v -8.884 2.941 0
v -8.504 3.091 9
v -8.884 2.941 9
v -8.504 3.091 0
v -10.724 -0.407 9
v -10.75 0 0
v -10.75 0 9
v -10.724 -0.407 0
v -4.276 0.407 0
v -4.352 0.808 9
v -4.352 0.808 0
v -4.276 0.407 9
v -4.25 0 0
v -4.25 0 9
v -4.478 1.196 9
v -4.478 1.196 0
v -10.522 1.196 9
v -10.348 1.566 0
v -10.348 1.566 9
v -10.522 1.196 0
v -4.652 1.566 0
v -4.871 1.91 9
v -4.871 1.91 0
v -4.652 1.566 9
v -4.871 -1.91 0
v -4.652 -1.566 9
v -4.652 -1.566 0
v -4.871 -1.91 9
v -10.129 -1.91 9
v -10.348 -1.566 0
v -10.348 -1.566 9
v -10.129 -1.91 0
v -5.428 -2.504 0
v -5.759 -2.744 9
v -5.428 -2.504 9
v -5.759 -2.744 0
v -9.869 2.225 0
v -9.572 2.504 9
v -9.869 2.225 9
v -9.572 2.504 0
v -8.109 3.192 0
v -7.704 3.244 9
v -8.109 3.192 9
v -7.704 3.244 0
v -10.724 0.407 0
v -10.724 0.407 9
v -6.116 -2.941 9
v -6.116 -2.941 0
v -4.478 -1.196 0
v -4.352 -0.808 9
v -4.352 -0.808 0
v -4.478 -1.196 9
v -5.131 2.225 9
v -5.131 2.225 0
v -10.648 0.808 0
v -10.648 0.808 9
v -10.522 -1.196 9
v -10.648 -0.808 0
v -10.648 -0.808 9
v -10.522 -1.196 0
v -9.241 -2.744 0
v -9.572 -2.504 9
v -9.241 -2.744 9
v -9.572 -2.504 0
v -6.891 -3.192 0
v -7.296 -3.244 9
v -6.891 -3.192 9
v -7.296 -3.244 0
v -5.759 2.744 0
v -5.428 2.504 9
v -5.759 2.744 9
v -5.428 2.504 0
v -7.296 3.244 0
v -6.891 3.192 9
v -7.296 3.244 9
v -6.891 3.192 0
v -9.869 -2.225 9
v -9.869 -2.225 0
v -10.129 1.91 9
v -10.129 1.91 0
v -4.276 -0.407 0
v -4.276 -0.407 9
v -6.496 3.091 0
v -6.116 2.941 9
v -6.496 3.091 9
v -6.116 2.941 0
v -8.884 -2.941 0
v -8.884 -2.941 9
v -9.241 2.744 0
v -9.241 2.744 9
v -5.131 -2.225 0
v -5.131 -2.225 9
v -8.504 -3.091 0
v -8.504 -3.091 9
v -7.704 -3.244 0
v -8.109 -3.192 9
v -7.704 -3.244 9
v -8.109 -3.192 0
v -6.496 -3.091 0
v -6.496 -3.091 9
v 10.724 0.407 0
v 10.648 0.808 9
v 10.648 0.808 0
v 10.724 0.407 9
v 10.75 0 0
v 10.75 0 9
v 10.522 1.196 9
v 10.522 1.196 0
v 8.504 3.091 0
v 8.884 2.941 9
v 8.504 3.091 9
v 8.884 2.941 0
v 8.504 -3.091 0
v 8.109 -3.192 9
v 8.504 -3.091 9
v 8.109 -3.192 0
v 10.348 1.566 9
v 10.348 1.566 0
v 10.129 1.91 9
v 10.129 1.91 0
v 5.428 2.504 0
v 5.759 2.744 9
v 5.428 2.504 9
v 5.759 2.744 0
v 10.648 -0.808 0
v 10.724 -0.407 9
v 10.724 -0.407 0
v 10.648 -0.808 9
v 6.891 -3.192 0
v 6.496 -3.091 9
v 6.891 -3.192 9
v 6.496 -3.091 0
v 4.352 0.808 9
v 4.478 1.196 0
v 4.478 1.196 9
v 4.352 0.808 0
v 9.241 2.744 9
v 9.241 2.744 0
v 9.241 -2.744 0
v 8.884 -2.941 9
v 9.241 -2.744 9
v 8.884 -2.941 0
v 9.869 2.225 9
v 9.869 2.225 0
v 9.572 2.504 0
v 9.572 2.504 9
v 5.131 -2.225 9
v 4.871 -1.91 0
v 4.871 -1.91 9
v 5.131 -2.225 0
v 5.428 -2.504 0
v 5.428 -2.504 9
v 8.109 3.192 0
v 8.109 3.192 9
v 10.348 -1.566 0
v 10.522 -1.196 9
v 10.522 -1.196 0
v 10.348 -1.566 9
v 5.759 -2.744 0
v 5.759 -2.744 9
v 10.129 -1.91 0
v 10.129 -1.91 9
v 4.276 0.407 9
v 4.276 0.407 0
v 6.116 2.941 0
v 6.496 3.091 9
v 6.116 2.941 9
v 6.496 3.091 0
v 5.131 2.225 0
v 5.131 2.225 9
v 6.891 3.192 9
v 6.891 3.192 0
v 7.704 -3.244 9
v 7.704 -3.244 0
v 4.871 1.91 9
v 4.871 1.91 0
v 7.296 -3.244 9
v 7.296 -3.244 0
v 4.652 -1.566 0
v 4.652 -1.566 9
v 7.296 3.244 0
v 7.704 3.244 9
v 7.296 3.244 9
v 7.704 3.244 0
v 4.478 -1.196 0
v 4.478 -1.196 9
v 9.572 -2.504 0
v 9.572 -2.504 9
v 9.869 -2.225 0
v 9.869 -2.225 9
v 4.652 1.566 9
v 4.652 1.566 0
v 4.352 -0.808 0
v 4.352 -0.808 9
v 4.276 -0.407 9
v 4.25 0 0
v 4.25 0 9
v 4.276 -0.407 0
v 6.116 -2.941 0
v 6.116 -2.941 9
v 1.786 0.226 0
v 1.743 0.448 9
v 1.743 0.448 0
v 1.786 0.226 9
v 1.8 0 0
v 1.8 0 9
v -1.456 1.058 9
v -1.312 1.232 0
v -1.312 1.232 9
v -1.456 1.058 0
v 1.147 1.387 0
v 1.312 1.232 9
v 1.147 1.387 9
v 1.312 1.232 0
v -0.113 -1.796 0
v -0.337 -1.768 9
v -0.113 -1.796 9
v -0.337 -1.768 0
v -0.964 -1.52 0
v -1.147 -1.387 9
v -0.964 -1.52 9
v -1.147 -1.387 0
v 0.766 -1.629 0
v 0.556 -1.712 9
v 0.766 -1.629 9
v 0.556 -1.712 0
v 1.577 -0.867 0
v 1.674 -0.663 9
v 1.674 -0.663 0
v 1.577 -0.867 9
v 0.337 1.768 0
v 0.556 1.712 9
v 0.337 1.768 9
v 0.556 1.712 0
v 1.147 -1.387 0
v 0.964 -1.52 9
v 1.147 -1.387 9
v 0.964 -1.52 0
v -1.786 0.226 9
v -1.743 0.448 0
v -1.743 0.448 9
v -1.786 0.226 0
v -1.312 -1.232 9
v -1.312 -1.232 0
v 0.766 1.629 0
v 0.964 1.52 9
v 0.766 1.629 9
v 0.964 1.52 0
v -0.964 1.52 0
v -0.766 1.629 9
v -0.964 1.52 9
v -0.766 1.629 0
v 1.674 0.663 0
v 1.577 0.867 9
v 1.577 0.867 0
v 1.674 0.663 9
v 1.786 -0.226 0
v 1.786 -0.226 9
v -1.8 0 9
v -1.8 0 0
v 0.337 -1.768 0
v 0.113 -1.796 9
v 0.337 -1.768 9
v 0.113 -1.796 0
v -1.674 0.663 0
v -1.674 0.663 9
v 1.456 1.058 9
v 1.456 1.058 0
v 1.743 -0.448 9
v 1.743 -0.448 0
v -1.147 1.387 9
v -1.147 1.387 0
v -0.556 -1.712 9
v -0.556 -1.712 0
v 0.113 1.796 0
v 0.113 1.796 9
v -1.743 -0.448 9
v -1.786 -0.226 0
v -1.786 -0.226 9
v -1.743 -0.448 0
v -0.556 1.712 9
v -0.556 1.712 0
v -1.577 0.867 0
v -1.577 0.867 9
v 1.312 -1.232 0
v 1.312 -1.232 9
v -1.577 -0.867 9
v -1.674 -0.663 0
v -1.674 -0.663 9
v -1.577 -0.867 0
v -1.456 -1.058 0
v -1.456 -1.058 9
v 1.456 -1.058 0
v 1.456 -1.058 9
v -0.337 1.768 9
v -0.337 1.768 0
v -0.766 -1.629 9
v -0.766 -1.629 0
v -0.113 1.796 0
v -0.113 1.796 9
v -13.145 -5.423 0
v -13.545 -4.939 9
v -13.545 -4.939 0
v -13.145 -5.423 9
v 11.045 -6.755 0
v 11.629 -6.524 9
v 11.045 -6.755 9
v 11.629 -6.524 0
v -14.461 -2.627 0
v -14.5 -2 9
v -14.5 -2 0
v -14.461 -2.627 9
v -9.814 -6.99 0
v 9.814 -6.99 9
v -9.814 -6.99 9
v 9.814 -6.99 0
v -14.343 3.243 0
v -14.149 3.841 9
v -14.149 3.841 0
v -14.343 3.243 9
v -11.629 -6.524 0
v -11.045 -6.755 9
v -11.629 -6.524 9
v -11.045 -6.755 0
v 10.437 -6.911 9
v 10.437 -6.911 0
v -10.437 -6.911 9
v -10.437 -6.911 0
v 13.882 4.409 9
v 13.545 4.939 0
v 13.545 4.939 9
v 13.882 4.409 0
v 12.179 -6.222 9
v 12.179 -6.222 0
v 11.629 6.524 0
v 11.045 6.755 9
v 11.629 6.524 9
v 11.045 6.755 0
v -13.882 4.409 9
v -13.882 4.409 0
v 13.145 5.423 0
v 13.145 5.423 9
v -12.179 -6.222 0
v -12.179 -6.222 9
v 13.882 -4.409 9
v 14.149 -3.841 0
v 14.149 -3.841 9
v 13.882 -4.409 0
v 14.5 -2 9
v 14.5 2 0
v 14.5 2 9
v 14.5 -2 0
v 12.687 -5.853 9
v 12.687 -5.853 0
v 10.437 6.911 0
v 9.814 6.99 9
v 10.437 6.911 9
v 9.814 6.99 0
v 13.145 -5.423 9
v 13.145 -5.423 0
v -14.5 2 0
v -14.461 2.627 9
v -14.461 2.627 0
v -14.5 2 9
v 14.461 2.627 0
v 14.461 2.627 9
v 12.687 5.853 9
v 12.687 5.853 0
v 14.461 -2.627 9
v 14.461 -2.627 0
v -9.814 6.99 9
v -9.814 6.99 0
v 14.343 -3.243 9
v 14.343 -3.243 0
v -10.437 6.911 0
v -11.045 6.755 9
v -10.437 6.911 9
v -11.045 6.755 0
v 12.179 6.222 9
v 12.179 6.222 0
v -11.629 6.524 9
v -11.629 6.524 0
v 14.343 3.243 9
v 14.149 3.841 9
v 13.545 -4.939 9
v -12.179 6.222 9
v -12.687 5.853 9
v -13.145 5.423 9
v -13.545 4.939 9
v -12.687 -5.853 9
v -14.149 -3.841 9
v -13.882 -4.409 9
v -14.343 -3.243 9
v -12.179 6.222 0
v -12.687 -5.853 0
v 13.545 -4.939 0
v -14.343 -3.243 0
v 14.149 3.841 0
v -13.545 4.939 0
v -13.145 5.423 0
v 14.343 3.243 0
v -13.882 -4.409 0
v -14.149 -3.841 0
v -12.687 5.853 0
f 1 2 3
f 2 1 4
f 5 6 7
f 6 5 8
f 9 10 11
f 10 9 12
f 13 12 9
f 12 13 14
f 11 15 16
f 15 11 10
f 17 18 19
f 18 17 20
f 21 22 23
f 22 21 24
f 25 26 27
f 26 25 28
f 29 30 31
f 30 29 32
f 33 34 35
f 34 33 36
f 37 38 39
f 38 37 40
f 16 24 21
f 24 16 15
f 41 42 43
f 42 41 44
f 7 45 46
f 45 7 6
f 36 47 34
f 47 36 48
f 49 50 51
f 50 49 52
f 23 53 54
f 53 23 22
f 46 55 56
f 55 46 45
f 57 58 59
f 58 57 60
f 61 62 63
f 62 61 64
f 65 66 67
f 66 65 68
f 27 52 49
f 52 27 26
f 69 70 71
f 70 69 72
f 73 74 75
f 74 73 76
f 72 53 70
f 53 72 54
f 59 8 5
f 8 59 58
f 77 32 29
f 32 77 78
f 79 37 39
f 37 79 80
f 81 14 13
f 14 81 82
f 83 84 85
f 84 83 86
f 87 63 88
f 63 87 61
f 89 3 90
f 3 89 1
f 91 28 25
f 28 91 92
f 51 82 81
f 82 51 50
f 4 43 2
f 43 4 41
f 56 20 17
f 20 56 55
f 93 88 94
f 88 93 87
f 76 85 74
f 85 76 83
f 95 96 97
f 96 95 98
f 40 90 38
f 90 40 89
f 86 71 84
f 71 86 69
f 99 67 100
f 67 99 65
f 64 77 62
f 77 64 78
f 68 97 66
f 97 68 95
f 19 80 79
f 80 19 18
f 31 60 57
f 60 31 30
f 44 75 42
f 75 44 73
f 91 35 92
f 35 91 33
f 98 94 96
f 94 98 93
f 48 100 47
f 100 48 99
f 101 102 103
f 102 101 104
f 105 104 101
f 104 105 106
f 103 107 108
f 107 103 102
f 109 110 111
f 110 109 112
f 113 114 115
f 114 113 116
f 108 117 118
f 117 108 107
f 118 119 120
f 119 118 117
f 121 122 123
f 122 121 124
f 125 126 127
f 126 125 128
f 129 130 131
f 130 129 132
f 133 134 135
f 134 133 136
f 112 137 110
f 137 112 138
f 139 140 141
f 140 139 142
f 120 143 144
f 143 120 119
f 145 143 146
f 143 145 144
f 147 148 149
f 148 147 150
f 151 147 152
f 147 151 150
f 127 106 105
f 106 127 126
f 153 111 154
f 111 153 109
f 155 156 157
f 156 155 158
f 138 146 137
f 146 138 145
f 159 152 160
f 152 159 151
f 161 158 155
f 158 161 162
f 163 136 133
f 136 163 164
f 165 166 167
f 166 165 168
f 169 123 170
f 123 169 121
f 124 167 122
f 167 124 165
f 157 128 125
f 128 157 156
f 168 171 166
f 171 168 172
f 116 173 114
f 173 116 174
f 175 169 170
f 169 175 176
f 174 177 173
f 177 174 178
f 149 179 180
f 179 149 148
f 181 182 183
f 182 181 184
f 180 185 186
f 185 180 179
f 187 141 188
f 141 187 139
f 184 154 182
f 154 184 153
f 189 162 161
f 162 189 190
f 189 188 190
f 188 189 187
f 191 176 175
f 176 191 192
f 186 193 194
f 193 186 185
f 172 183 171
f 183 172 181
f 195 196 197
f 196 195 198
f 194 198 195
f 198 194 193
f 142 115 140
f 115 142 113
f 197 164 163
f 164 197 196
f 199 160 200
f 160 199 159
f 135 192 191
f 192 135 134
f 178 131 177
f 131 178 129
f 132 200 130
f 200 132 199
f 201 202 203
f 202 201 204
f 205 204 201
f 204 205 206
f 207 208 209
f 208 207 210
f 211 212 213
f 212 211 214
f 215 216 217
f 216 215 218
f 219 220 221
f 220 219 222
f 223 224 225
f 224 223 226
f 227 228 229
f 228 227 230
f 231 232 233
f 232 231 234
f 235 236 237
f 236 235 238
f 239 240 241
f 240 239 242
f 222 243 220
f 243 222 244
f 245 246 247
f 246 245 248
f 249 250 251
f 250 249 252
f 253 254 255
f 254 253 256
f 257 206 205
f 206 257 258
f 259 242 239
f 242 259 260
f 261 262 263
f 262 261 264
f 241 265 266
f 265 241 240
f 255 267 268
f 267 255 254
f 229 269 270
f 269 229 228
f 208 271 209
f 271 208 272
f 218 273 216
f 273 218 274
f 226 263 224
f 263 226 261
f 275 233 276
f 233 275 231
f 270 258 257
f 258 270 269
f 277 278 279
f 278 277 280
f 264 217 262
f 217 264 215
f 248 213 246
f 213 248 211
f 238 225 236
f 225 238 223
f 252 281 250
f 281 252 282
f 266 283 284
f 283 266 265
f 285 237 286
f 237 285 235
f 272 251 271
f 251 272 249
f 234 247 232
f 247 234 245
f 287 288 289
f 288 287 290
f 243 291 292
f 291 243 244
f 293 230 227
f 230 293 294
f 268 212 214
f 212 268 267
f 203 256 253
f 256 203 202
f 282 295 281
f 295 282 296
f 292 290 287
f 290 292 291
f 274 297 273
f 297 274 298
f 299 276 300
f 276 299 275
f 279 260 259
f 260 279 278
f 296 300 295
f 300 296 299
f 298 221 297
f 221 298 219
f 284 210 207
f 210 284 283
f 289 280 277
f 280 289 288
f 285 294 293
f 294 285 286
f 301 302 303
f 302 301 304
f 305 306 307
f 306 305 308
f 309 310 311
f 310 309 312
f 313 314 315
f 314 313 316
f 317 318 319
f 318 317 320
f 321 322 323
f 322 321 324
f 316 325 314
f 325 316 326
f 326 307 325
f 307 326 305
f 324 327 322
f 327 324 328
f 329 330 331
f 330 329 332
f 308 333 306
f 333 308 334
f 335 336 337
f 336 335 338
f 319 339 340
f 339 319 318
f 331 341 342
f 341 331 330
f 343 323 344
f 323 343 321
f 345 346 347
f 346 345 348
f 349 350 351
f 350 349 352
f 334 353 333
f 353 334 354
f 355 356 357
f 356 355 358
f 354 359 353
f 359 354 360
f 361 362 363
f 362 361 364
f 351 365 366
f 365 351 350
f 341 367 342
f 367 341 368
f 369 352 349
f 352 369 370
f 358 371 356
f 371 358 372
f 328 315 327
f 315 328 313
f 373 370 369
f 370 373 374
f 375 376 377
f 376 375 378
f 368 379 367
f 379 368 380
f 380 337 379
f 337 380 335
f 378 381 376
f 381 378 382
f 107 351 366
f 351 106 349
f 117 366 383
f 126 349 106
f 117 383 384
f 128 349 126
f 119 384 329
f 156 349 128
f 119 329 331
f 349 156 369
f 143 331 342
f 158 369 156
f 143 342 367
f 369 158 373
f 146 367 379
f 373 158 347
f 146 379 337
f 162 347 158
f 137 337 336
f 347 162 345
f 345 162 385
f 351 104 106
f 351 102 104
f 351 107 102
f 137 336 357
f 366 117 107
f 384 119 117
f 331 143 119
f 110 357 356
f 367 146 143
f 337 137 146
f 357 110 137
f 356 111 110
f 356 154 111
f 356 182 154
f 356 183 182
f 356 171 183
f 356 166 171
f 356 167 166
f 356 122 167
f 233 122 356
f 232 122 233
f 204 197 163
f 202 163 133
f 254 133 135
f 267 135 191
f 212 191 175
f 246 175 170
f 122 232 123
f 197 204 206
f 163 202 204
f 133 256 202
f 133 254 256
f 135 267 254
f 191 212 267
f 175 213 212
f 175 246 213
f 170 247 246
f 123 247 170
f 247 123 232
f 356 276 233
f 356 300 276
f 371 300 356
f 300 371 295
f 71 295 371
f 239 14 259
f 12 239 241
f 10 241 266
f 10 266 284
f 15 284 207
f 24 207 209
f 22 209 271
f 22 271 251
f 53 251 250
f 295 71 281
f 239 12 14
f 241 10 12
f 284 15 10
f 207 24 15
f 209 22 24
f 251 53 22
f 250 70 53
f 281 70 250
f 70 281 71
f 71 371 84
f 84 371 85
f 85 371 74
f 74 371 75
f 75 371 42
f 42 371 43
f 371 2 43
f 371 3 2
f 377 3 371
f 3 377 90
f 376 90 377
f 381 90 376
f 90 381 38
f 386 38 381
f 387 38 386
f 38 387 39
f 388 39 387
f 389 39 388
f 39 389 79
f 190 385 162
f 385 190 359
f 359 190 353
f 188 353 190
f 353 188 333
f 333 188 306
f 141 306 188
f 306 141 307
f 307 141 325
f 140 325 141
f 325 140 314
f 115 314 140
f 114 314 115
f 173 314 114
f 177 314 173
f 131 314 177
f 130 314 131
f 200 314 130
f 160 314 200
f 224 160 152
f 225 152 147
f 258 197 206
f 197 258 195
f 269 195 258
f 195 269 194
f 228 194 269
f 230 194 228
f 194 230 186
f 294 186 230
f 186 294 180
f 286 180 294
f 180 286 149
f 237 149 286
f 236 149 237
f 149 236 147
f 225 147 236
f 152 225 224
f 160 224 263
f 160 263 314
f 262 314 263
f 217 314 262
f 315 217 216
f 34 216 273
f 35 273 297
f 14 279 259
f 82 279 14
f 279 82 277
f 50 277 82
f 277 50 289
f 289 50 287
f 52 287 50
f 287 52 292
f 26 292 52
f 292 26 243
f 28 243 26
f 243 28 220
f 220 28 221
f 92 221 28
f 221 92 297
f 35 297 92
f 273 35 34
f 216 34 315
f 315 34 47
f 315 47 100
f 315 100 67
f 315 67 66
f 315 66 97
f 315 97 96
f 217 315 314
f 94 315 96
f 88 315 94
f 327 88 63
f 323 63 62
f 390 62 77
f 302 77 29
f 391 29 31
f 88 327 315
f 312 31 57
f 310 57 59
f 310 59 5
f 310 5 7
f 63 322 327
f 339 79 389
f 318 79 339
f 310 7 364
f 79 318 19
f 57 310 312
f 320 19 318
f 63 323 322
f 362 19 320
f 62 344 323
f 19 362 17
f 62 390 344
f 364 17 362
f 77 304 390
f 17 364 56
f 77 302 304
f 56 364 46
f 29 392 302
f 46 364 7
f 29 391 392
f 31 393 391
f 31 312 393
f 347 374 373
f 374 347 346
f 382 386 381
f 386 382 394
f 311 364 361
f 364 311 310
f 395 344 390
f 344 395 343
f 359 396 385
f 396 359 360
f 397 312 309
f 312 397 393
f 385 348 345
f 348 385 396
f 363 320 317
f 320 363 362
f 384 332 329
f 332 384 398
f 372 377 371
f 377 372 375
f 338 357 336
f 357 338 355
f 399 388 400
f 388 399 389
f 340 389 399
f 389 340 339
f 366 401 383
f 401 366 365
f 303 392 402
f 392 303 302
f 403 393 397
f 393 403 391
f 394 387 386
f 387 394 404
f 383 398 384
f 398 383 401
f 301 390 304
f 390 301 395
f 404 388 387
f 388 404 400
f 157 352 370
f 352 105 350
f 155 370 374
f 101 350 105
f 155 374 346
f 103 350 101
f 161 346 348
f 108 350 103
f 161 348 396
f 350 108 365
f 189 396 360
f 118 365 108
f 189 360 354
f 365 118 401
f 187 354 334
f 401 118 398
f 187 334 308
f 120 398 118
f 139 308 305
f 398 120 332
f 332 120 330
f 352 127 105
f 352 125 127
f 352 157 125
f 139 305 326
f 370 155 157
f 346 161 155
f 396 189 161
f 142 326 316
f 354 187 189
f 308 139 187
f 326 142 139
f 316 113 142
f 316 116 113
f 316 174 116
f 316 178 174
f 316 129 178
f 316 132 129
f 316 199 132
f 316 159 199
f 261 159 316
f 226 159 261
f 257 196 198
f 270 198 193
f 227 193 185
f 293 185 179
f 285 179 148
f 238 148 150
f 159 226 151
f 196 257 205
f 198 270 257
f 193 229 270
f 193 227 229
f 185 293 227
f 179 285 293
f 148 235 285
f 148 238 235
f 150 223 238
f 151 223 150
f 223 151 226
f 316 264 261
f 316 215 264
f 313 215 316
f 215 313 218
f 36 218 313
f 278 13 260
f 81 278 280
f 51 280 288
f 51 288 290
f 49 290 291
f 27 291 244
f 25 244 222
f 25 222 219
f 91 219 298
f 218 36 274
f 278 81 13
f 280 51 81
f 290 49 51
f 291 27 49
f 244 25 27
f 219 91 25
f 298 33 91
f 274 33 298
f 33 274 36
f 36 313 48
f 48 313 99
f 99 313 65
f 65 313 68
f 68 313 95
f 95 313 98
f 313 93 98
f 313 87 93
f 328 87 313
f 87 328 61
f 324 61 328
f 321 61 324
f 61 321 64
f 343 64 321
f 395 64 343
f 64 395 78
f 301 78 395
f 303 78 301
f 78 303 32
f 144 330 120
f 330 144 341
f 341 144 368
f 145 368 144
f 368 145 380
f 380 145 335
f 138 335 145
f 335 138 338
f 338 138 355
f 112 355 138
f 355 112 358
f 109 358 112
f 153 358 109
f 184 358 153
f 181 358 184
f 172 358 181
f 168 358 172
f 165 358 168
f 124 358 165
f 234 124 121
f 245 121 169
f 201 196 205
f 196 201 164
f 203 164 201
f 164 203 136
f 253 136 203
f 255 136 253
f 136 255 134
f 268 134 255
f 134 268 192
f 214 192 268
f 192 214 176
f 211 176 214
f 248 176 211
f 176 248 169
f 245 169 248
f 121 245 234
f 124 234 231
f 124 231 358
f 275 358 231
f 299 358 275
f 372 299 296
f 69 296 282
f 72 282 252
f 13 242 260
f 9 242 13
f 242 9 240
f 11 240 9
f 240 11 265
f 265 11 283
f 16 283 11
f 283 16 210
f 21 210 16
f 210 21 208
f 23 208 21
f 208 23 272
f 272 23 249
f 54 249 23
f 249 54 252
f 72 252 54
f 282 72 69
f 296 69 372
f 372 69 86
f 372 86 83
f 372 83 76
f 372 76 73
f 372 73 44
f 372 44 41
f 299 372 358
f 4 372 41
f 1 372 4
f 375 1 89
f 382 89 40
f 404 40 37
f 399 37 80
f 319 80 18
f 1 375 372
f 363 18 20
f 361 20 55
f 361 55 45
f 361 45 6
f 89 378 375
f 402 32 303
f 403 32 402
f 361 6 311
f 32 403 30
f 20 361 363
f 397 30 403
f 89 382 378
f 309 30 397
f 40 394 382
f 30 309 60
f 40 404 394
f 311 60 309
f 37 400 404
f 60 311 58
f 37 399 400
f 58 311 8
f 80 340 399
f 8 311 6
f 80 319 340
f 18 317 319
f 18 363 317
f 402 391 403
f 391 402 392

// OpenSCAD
$fn = 50;


difference() {
	union() {
		hull() {
			translate(v = [-9.5000000000, 2.0000000000, 0]) {
				cylinder(h = 9, r = 5);
			}
			translate(v = [9.5000000000, 2.0000000000, 0]) {
				cylinder(h = 9, r = 5);
			}
			translate(v = [-9.5000000000, -2.0000000000, 0]) {
				cylinder(h = 9, r = 5);
			}
			translate(v = [9.5000000000, -2.0000000000, 0]) {
				cylinder(h = 9, r = 5);
			}
		}
	}
	union() {
		translate(v = [-7.5000000000, 0.0000000000, 0]) {
			translate(v = [0, 0, -100]) {
				cylinder(h = 200, r = 3.2500000000);
			}
		}
		translate(v = [7.5000000000, 0.0000000000, 0]) {
			translate(v = [0, 0, -100]) {
				cylinder(h = 200, r = 3.2500000000);
			}
		}
		translate(v = [-7.5000000000, 0.0000000000, 0]) {
			translate(v = [0, 0, -100]) {
				cylinder(h = 200, r = 1.8000000000);
			}
		}
		translate(v = [0, 0, -100]) {
			cylinder(h = 200, r = 1.8000000000);
		}
		translate(v = [7.5000000000, 0.0000000000, 0]) {
			translate(v = [0, 0, -100]) {
				cylinder(h = 200, r = 1.8000000000);
			}
		}
	}
}
